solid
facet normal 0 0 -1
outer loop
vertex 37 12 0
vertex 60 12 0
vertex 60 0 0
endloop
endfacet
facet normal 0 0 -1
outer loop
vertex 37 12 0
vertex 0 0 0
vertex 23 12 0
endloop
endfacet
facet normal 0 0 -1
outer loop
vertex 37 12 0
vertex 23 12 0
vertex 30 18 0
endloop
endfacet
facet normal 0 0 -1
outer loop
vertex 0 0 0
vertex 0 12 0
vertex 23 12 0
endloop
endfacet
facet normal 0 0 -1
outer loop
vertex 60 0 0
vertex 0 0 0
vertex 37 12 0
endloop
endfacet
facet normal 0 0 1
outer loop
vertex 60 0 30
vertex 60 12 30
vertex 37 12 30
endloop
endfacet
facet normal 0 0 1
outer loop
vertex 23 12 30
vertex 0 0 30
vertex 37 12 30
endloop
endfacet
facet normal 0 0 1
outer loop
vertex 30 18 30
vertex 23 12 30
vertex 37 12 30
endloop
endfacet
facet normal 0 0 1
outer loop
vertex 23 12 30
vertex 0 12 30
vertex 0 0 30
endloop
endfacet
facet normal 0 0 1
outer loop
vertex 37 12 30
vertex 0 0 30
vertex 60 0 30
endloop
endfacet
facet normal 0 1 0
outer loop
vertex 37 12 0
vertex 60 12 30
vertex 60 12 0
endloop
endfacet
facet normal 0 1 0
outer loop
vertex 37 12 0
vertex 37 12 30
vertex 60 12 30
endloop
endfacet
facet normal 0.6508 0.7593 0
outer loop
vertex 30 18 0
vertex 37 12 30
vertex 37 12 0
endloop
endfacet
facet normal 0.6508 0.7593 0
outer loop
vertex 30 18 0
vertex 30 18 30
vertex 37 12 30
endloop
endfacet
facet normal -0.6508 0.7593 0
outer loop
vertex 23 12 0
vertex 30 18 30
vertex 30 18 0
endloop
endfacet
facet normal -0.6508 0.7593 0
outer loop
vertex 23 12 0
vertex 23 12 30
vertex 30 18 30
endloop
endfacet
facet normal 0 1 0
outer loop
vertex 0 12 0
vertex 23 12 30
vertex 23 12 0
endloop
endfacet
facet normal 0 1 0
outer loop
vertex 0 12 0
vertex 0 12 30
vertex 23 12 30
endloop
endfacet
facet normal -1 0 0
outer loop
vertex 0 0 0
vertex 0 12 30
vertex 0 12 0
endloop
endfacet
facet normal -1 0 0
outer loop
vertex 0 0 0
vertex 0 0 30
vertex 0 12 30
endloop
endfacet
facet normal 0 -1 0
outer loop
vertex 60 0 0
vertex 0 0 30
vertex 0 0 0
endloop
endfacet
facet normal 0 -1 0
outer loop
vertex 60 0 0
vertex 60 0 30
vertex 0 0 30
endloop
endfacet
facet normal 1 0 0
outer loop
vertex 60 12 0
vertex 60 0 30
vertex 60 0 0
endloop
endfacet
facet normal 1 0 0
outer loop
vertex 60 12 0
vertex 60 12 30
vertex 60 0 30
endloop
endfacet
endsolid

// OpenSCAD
$fn = 32;

// ----------------------------------------------------------------------
// V guide rail: vrib, 60 mm wide
// ----------------------------------------------------------------------

// --- parameters (mm) ---
rail_w = 60;              // rail width, X
base_t = 12;              // base plate thickness
v_depth = 6;              // V feature depth / height
v_half_w = 7;             // half width of the V at the base face
plate_t = 30;             // rail length, Z (the extrusion height)

profile = [[0, 0], [60, 0], [60, 12], [37, 12], [30, 18], [23, 12], [0, 12]];  // primary outline, 7 points, counter clockwise

// --- the one profile operation ---
linear_extrude(height = plate_t) polygon(points = profile);
